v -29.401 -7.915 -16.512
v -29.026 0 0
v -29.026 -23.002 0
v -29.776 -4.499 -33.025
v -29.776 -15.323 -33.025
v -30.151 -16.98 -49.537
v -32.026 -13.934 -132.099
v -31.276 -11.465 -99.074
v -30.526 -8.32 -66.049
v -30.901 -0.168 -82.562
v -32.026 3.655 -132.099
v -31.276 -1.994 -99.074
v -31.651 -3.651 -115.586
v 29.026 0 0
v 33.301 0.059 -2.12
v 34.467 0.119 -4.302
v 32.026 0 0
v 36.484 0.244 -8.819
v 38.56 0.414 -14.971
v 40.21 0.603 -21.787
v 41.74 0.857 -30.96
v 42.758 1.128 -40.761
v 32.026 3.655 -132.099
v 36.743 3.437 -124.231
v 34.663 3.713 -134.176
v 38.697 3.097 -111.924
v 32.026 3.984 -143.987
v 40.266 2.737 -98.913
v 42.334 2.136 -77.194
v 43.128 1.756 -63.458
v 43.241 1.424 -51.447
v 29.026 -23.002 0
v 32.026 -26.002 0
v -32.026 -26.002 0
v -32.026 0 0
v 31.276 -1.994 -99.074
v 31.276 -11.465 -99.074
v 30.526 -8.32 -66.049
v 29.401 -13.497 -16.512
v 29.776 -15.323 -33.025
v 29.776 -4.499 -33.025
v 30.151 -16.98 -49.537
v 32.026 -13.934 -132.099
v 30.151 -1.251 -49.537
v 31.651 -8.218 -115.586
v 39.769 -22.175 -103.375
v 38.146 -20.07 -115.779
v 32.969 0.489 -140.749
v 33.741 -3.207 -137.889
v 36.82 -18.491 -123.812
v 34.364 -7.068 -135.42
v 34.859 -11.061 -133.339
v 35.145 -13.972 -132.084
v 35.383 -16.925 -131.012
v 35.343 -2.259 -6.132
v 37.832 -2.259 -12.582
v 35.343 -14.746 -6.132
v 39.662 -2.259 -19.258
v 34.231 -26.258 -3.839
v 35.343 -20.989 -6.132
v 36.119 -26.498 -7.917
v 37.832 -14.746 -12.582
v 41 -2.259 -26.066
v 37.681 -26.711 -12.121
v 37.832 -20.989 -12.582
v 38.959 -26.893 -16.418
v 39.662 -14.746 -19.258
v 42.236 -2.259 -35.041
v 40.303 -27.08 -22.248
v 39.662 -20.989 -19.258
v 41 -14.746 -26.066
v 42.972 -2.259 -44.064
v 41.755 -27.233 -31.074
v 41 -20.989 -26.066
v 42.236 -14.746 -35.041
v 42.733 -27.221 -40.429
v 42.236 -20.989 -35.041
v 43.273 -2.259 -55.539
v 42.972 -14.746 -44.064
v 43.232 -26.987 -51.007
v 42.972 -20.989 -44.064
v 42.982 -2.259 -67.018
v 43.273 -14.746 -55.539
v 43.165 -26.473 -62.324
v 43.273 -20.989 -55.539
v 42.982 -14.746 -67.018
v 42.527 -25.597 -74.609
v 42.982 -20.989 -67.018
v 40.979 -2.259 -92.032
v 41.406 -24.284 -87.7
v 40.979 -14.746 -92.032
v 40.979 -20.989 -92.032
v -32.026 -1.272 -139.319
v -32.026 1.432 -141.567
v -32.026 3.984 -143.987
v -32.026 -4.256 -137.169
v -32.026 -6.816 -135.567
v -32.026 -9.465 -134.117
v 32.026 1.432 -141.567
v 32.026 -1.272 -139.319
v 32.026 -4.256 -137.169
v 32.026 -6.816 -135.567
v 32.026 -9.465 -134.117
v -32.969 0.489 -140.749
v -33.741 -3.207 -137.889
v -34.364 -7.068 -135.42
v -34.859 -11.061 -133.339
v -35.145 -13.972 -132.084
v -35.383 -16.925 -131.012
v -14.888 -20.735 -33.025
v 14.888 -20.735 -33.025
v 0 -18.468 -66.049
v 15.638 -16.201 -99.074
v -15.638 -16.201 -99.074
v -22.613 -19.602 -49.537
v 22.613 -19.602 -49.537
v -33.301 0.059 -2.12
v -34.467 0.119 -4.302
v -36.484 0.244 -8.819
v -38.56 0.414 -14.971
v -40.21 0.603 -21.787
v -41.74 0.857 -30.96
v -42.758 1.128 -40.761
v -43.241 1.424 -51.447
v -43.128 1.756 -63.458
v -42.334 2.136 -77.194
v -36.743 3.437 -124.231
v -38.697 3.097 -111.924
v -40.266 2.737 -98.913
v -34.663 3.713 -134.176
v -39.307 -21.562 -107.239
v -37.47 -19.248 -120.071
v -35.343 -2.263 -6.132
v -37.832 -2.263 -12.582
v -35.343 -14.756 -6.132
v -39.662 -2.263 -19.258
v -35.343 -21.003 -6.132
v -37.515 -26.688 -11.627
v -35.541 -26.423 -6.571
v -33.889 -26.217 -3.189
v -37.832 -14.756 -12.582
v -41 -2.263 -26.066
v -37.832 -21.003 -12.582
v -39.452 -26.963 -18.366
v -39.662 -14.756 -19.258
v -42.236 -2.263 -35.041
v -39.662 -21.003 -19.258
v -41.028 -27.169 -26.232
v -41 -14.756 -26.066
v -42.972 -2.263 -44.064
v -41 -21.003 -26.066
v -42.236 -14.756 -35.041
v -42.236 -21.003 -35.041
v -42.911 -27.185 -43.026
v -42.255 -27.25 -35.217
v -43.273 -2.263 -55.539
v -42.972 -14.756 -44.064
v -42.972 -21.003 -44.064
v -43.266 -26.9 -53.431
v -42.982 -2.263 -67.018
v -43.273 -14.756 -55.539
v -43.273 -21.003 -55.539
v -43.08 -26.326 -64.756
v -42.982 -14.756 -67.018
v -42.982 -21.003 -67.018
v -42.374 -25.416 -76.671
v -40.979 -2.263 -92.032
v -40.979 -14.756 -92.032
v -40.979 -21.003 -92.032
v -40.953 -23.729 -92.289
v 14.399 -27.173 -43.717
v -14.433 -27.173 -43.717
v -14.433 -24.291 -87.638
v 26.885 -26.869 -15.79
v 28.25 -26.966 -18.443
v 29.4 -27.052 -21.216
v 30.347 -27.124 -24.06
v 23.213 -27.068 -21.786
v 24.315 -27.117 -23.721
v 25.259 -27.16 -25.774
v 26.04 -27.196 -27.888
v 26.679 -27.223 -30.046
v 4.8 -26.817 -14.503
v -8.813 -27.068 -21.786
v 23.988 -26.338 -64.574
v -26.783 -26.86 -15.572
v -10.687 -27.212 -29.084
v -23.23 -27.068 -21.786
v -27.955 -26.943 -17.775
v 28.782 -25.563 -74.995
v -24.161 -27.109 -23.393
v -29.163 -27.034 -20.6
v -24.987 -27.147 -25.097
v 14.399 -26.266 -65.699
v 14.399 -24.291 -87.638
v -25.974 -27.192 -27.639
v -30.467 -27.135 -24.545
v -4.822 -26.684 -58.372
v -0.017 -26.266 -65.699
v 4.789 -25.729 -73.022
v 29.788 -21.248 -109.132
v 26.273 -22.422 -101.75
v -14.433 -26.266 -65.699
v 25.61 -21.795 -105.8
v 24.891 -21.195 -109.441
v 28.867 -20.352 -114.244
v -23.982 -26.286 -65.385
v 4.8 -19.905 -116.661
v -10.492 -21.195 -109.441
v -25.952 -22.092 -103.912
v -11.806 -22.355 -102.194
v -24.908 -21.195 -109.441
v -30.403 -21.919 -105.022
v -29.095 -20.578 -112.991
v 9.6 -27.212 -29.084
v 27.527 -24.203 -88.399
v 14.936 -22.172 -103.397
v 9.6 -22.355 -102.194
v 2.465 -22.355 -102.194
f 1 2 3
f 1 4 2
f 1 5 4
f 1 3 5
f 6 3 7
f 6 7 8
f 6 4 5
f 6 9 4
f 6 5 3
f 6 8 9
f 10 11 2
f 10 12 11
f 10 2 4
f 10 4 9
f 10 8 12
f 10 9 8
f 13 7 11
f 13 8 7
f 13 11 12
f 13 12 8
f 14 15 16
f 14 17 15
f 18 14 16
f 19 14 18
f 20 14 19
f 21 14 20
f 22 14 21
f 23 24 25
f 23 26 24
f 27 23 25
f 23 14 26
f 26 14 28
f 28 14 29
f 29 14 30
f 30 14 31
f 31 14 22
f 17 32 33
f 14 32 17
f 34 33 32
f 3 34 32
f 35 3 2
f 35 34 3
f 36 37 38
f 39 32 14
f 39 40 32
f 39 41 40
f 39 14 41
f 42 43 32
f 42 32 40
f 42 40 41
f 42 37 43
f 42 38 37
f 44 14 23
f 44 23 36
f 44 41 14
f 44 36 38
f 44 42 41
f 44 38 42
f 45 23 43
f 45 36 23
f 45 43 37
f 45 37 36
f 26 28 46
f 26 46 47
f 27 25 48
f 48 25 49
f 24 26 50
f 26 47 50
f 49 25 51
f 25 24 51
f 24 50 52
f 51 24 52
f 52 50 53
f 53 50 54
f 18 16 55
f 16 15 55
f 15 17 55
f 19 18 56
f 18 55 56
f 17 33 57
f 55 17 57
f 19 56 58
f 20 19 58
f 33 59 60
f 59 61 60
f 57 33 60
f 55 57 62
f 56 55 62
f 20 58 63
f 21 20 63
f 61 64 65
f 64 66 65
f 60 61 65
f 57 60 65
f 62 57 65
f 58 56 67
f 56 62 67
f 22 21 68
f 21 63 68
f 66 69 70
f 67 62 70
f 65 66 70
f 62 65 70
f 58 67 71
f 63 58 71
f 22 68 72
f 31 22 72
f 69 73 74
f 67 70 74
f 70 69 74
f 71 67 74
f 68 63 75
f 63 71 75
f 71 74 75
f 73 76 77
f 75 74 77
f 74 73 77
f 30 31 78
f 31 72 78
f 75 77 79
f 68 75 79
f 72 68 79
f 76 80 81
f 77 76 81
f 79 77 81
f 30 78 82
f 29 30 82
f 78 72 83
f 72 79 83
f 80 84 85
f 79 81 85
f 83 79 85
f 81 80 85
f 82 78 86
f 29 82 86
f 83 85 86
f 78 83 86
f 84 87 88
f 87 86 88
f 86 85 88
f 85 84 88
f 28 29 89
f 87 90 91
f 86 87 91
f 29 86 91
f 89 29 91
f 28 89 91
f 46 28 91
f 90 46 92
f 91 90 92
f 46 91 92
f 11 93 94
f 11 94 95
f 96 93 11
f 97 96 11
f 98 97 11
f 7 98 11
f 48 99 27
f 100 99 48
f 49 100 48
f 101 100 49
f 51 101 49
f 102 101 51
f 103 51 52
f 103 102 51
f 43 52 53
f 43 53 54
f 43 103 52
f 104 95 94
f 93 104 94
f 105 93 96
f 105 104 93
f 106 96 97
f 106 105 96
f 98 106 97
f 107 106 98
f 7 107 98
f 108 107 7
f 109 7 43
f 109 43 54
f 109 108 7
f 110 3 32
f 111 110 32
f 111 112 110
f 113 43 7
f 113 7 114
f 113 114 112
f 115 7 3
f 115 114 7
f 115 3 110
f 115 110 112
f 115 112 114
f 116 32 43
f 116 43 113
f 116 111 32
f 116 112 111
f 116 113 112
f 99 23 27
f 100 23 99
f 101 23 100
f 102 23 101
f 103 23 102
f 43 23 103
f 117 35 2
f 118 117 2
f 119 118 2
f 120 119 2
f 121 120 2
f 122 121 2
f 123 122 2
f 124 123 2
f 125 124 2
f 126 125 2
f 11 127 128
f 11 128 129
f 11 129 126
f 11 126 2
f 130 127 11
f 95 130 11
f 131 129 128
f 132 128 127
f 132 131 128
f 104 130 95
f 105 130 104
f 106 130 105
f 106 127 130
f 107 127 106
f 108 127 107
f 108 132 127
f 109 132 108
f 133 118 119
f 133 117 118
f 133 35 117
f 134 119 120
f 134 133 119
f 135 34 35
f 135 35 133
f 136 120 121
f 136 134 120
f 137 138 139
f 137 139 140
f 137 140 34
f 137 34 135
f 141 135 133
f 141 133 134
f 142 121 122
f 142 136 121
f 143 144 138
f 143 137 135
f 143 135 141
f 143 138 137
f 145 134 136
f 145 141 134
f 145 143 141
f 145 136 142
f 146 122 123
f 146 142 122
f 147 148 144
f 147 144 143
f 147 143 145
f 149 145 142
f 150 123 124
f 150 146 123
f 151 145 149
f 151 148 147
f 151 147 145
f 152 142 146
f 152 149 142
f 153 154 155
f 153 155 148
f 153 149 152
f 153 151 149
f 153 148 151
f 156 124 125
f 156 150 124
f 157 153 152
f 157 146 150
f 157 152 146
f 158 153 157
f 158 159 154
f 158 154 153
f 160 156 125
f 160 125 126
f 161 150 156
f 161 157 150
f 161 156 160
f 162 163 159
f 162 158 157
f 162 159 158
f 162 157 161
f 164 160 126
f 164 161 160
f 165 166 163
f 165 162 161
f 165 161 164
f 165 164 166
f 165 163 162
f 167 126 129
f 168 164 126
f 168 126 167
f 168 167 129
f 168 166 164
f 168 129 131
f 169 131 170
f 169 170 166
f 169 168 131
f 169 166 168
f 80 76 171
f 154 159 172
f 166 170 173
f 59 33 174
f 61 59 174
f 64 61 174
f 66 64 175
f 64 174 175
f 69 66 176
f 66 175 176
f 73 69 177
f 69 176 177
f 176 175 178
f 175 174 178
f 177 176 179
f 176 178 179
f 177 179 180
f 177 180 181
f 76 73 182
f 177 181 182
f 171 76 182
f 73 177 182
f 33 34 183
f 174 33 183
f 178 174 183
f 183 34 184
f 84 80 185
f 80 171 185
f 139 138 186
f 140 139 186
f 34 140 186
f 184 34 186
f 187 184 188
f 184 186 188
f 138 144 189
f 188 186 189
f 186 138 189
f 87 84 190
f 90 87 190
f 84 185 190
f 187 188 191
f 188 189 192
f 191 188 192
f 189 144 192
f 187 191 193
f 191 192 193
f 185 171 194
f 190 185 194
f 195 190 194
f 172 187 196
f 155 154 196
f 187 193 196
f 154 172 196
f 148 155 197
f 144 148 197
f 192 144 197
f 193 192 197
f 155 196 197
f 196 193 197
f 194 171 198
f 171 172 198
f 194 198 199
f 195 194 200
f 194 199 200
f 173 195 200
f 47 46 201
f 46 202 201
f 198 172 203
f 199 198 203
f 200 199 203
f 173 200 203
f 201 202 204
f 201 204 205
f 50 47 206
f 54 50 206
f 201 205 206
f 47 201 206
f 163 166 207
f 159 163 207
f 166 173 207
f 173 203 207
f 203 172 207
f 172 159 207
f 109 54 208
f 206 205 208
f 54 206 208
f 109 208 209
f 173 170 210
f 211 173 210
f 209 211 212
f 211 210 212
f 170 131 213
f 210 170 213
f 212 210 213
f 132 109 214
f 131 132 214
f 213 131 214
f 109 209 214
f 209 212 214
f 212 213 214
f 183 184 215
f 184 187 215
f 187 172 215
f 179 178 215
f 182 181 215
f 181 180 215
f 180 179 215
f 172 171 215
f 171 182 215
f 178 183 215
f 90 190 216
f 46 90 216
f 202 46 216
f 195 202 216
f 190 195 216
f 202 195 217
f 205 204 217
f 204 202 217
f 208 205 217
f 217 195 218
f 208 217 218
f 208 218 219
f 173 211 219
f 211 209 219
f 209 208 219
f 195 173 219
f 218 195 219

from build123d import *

# Parameters (mm, degrees)
BOSS_EXTRUDE2_DEPTH      = 45
BOSS_EXTRUDE2_DEPTH_BACK = 45
CUT_EXTRUDE3_START       = -27.249786541
CUT_EXTRUDE3_DEPTH       = 31.233789291


# Read off the part's stored shape, not the designer's step: Cut-Extrude3
with BuildPart() as part:
    # Sketch2 (on Right Plane) → Boss-Extrude2 (new, two sides: drawn at the far end of the back side and taken through both)
    with BuildSketch(Plane(origin=(0, 0, 0), x_dir=(0, 0, -1), z_dir=(1, 0, 0)).offset(-BOSS_EXTRUDE2_DEPTH_BACK)):
        with BuildLine():
            Line((0, 0), (143.987102048, 3.98400275))
            add(Edge.make_bspline(
                [(143.987102048, 3.98400275), (134.984630488, -4.921448011), (131.011727331, -16.925050269)],
                knots=[0, 0, 0, 1, 1, 1], degree=2))
            add(Edge.make_bspline(
                [(0, -26.002445347), (43.362857404, -29.056607153), (88.163793894, -26.676585526), (131.011727331, -16.925050269)],
                knots=[0, 0, 0, 0, 1, 1, 1, 1], degree=3))
            Line((0, -26.002445347), (0, 0))
        make_face()
    extrude(amount=BOSS_EXTRUDE2_DEPTH + BOSS_EXTRUDE2_DEPTH_BACK)

    # Cut-Extrude3 outline → Cut-Extrude3 (cut)
    with BuildSketch(Plane(origin=(0, 0, 0), x_dir=(1, 0, 0), z_dir=(0, 1, 0)).offset(CUT_EXTRUDE3_START)):
        with BuildLine():
            add(Edge.make_bspline(
                [(32.026201302, 0), (37.076161421, 7.923289645), (41.031245364, 22.834124934), (43.440169572, 45.655033799), (43.287987849, 67.756764471), (40.19763091, 101.225098423), (37.162532459, 127.048485942), (32.026201302, 143.987102048)],
                knots=[0, 0, 0, 0, 0.188938081, 0.312405275, 0.468938442, 0.640066909, 1, 1, 1, 1], degree=3))
            Line((32.026201302, 0), (45, 0))
            Line((45, 0), (45, 145))
            Line((45, 145), (-45, 145))
            Line((-45, 145), (-45, 0))
            Line((-45, 0), (-32.026201302, 0))
            add(Edge.make_bspline(
                [(-32.026201302, 0), (-37.076161421, 7.923289645), (-41.031245364, 22.834124934), (-43.440169572, 45.655033799), (-43.287987849, 67.756764471), (-40.19763091, 101.225098423), (-37.162532459, 127.048485942), (-32.026201302, 143.987102048)],
                knots=[0, 0, 0, 0, 0.188938081, 0.312405275, 0.468938442, 0.640066909, 1, 1, 1, 1], degree=3))
            Line((-32.026201302, 143.987102048), (-32.026201302, 132.09884068))
            Line((-32.026201302, 132.09884068), (32.026201302, 132.09884068))
            Line((32.026201302, 132.09884068), (32.026201302, 143.987102048))
        make_face()
    extrude(amount=CUT_EXTRUDE3_DEPTH, mode=Mode.SUBTRACT)

    # Sketch6 → Cut-Loft1 section 0
    with BuildSketch(Plane.XY):
        with BuildLine():
            Line((-29.026201302, 0), (-29.026201302, -23.002445347))
            Line((-29.026201302, -23.002445347), (29.026201302, -23.002445347))
            Line((29.026201302, -23.002445347), (29.026201302, 0))
            Line((29.026201302, 0), (-29.026201302, 0))
        make_face()
    # Sketch5 → Cut-Loft1 section 1
    with BuildSketch(Plane(origin=(0, 0, -132.09884068), x_dir=(-1, 0, 0), z_dir=(0, 0, -1))):
        with BuildLine():
            Line((-32.026201302, -13.933976996), (32.026201302, -13.933976996))
            Line((32.026201302, -13.933976996), (32.026201302, 3.655064496))
            Line((32.026201302, 3.655064496), (-32.026201302, 3.655064496))
            Line((-32.026201302, 3.655064496), (-32.026201302, -13.933976996))
        make_face()
    loft(mode=Mode.SUBTRACT)


solid = part.part
